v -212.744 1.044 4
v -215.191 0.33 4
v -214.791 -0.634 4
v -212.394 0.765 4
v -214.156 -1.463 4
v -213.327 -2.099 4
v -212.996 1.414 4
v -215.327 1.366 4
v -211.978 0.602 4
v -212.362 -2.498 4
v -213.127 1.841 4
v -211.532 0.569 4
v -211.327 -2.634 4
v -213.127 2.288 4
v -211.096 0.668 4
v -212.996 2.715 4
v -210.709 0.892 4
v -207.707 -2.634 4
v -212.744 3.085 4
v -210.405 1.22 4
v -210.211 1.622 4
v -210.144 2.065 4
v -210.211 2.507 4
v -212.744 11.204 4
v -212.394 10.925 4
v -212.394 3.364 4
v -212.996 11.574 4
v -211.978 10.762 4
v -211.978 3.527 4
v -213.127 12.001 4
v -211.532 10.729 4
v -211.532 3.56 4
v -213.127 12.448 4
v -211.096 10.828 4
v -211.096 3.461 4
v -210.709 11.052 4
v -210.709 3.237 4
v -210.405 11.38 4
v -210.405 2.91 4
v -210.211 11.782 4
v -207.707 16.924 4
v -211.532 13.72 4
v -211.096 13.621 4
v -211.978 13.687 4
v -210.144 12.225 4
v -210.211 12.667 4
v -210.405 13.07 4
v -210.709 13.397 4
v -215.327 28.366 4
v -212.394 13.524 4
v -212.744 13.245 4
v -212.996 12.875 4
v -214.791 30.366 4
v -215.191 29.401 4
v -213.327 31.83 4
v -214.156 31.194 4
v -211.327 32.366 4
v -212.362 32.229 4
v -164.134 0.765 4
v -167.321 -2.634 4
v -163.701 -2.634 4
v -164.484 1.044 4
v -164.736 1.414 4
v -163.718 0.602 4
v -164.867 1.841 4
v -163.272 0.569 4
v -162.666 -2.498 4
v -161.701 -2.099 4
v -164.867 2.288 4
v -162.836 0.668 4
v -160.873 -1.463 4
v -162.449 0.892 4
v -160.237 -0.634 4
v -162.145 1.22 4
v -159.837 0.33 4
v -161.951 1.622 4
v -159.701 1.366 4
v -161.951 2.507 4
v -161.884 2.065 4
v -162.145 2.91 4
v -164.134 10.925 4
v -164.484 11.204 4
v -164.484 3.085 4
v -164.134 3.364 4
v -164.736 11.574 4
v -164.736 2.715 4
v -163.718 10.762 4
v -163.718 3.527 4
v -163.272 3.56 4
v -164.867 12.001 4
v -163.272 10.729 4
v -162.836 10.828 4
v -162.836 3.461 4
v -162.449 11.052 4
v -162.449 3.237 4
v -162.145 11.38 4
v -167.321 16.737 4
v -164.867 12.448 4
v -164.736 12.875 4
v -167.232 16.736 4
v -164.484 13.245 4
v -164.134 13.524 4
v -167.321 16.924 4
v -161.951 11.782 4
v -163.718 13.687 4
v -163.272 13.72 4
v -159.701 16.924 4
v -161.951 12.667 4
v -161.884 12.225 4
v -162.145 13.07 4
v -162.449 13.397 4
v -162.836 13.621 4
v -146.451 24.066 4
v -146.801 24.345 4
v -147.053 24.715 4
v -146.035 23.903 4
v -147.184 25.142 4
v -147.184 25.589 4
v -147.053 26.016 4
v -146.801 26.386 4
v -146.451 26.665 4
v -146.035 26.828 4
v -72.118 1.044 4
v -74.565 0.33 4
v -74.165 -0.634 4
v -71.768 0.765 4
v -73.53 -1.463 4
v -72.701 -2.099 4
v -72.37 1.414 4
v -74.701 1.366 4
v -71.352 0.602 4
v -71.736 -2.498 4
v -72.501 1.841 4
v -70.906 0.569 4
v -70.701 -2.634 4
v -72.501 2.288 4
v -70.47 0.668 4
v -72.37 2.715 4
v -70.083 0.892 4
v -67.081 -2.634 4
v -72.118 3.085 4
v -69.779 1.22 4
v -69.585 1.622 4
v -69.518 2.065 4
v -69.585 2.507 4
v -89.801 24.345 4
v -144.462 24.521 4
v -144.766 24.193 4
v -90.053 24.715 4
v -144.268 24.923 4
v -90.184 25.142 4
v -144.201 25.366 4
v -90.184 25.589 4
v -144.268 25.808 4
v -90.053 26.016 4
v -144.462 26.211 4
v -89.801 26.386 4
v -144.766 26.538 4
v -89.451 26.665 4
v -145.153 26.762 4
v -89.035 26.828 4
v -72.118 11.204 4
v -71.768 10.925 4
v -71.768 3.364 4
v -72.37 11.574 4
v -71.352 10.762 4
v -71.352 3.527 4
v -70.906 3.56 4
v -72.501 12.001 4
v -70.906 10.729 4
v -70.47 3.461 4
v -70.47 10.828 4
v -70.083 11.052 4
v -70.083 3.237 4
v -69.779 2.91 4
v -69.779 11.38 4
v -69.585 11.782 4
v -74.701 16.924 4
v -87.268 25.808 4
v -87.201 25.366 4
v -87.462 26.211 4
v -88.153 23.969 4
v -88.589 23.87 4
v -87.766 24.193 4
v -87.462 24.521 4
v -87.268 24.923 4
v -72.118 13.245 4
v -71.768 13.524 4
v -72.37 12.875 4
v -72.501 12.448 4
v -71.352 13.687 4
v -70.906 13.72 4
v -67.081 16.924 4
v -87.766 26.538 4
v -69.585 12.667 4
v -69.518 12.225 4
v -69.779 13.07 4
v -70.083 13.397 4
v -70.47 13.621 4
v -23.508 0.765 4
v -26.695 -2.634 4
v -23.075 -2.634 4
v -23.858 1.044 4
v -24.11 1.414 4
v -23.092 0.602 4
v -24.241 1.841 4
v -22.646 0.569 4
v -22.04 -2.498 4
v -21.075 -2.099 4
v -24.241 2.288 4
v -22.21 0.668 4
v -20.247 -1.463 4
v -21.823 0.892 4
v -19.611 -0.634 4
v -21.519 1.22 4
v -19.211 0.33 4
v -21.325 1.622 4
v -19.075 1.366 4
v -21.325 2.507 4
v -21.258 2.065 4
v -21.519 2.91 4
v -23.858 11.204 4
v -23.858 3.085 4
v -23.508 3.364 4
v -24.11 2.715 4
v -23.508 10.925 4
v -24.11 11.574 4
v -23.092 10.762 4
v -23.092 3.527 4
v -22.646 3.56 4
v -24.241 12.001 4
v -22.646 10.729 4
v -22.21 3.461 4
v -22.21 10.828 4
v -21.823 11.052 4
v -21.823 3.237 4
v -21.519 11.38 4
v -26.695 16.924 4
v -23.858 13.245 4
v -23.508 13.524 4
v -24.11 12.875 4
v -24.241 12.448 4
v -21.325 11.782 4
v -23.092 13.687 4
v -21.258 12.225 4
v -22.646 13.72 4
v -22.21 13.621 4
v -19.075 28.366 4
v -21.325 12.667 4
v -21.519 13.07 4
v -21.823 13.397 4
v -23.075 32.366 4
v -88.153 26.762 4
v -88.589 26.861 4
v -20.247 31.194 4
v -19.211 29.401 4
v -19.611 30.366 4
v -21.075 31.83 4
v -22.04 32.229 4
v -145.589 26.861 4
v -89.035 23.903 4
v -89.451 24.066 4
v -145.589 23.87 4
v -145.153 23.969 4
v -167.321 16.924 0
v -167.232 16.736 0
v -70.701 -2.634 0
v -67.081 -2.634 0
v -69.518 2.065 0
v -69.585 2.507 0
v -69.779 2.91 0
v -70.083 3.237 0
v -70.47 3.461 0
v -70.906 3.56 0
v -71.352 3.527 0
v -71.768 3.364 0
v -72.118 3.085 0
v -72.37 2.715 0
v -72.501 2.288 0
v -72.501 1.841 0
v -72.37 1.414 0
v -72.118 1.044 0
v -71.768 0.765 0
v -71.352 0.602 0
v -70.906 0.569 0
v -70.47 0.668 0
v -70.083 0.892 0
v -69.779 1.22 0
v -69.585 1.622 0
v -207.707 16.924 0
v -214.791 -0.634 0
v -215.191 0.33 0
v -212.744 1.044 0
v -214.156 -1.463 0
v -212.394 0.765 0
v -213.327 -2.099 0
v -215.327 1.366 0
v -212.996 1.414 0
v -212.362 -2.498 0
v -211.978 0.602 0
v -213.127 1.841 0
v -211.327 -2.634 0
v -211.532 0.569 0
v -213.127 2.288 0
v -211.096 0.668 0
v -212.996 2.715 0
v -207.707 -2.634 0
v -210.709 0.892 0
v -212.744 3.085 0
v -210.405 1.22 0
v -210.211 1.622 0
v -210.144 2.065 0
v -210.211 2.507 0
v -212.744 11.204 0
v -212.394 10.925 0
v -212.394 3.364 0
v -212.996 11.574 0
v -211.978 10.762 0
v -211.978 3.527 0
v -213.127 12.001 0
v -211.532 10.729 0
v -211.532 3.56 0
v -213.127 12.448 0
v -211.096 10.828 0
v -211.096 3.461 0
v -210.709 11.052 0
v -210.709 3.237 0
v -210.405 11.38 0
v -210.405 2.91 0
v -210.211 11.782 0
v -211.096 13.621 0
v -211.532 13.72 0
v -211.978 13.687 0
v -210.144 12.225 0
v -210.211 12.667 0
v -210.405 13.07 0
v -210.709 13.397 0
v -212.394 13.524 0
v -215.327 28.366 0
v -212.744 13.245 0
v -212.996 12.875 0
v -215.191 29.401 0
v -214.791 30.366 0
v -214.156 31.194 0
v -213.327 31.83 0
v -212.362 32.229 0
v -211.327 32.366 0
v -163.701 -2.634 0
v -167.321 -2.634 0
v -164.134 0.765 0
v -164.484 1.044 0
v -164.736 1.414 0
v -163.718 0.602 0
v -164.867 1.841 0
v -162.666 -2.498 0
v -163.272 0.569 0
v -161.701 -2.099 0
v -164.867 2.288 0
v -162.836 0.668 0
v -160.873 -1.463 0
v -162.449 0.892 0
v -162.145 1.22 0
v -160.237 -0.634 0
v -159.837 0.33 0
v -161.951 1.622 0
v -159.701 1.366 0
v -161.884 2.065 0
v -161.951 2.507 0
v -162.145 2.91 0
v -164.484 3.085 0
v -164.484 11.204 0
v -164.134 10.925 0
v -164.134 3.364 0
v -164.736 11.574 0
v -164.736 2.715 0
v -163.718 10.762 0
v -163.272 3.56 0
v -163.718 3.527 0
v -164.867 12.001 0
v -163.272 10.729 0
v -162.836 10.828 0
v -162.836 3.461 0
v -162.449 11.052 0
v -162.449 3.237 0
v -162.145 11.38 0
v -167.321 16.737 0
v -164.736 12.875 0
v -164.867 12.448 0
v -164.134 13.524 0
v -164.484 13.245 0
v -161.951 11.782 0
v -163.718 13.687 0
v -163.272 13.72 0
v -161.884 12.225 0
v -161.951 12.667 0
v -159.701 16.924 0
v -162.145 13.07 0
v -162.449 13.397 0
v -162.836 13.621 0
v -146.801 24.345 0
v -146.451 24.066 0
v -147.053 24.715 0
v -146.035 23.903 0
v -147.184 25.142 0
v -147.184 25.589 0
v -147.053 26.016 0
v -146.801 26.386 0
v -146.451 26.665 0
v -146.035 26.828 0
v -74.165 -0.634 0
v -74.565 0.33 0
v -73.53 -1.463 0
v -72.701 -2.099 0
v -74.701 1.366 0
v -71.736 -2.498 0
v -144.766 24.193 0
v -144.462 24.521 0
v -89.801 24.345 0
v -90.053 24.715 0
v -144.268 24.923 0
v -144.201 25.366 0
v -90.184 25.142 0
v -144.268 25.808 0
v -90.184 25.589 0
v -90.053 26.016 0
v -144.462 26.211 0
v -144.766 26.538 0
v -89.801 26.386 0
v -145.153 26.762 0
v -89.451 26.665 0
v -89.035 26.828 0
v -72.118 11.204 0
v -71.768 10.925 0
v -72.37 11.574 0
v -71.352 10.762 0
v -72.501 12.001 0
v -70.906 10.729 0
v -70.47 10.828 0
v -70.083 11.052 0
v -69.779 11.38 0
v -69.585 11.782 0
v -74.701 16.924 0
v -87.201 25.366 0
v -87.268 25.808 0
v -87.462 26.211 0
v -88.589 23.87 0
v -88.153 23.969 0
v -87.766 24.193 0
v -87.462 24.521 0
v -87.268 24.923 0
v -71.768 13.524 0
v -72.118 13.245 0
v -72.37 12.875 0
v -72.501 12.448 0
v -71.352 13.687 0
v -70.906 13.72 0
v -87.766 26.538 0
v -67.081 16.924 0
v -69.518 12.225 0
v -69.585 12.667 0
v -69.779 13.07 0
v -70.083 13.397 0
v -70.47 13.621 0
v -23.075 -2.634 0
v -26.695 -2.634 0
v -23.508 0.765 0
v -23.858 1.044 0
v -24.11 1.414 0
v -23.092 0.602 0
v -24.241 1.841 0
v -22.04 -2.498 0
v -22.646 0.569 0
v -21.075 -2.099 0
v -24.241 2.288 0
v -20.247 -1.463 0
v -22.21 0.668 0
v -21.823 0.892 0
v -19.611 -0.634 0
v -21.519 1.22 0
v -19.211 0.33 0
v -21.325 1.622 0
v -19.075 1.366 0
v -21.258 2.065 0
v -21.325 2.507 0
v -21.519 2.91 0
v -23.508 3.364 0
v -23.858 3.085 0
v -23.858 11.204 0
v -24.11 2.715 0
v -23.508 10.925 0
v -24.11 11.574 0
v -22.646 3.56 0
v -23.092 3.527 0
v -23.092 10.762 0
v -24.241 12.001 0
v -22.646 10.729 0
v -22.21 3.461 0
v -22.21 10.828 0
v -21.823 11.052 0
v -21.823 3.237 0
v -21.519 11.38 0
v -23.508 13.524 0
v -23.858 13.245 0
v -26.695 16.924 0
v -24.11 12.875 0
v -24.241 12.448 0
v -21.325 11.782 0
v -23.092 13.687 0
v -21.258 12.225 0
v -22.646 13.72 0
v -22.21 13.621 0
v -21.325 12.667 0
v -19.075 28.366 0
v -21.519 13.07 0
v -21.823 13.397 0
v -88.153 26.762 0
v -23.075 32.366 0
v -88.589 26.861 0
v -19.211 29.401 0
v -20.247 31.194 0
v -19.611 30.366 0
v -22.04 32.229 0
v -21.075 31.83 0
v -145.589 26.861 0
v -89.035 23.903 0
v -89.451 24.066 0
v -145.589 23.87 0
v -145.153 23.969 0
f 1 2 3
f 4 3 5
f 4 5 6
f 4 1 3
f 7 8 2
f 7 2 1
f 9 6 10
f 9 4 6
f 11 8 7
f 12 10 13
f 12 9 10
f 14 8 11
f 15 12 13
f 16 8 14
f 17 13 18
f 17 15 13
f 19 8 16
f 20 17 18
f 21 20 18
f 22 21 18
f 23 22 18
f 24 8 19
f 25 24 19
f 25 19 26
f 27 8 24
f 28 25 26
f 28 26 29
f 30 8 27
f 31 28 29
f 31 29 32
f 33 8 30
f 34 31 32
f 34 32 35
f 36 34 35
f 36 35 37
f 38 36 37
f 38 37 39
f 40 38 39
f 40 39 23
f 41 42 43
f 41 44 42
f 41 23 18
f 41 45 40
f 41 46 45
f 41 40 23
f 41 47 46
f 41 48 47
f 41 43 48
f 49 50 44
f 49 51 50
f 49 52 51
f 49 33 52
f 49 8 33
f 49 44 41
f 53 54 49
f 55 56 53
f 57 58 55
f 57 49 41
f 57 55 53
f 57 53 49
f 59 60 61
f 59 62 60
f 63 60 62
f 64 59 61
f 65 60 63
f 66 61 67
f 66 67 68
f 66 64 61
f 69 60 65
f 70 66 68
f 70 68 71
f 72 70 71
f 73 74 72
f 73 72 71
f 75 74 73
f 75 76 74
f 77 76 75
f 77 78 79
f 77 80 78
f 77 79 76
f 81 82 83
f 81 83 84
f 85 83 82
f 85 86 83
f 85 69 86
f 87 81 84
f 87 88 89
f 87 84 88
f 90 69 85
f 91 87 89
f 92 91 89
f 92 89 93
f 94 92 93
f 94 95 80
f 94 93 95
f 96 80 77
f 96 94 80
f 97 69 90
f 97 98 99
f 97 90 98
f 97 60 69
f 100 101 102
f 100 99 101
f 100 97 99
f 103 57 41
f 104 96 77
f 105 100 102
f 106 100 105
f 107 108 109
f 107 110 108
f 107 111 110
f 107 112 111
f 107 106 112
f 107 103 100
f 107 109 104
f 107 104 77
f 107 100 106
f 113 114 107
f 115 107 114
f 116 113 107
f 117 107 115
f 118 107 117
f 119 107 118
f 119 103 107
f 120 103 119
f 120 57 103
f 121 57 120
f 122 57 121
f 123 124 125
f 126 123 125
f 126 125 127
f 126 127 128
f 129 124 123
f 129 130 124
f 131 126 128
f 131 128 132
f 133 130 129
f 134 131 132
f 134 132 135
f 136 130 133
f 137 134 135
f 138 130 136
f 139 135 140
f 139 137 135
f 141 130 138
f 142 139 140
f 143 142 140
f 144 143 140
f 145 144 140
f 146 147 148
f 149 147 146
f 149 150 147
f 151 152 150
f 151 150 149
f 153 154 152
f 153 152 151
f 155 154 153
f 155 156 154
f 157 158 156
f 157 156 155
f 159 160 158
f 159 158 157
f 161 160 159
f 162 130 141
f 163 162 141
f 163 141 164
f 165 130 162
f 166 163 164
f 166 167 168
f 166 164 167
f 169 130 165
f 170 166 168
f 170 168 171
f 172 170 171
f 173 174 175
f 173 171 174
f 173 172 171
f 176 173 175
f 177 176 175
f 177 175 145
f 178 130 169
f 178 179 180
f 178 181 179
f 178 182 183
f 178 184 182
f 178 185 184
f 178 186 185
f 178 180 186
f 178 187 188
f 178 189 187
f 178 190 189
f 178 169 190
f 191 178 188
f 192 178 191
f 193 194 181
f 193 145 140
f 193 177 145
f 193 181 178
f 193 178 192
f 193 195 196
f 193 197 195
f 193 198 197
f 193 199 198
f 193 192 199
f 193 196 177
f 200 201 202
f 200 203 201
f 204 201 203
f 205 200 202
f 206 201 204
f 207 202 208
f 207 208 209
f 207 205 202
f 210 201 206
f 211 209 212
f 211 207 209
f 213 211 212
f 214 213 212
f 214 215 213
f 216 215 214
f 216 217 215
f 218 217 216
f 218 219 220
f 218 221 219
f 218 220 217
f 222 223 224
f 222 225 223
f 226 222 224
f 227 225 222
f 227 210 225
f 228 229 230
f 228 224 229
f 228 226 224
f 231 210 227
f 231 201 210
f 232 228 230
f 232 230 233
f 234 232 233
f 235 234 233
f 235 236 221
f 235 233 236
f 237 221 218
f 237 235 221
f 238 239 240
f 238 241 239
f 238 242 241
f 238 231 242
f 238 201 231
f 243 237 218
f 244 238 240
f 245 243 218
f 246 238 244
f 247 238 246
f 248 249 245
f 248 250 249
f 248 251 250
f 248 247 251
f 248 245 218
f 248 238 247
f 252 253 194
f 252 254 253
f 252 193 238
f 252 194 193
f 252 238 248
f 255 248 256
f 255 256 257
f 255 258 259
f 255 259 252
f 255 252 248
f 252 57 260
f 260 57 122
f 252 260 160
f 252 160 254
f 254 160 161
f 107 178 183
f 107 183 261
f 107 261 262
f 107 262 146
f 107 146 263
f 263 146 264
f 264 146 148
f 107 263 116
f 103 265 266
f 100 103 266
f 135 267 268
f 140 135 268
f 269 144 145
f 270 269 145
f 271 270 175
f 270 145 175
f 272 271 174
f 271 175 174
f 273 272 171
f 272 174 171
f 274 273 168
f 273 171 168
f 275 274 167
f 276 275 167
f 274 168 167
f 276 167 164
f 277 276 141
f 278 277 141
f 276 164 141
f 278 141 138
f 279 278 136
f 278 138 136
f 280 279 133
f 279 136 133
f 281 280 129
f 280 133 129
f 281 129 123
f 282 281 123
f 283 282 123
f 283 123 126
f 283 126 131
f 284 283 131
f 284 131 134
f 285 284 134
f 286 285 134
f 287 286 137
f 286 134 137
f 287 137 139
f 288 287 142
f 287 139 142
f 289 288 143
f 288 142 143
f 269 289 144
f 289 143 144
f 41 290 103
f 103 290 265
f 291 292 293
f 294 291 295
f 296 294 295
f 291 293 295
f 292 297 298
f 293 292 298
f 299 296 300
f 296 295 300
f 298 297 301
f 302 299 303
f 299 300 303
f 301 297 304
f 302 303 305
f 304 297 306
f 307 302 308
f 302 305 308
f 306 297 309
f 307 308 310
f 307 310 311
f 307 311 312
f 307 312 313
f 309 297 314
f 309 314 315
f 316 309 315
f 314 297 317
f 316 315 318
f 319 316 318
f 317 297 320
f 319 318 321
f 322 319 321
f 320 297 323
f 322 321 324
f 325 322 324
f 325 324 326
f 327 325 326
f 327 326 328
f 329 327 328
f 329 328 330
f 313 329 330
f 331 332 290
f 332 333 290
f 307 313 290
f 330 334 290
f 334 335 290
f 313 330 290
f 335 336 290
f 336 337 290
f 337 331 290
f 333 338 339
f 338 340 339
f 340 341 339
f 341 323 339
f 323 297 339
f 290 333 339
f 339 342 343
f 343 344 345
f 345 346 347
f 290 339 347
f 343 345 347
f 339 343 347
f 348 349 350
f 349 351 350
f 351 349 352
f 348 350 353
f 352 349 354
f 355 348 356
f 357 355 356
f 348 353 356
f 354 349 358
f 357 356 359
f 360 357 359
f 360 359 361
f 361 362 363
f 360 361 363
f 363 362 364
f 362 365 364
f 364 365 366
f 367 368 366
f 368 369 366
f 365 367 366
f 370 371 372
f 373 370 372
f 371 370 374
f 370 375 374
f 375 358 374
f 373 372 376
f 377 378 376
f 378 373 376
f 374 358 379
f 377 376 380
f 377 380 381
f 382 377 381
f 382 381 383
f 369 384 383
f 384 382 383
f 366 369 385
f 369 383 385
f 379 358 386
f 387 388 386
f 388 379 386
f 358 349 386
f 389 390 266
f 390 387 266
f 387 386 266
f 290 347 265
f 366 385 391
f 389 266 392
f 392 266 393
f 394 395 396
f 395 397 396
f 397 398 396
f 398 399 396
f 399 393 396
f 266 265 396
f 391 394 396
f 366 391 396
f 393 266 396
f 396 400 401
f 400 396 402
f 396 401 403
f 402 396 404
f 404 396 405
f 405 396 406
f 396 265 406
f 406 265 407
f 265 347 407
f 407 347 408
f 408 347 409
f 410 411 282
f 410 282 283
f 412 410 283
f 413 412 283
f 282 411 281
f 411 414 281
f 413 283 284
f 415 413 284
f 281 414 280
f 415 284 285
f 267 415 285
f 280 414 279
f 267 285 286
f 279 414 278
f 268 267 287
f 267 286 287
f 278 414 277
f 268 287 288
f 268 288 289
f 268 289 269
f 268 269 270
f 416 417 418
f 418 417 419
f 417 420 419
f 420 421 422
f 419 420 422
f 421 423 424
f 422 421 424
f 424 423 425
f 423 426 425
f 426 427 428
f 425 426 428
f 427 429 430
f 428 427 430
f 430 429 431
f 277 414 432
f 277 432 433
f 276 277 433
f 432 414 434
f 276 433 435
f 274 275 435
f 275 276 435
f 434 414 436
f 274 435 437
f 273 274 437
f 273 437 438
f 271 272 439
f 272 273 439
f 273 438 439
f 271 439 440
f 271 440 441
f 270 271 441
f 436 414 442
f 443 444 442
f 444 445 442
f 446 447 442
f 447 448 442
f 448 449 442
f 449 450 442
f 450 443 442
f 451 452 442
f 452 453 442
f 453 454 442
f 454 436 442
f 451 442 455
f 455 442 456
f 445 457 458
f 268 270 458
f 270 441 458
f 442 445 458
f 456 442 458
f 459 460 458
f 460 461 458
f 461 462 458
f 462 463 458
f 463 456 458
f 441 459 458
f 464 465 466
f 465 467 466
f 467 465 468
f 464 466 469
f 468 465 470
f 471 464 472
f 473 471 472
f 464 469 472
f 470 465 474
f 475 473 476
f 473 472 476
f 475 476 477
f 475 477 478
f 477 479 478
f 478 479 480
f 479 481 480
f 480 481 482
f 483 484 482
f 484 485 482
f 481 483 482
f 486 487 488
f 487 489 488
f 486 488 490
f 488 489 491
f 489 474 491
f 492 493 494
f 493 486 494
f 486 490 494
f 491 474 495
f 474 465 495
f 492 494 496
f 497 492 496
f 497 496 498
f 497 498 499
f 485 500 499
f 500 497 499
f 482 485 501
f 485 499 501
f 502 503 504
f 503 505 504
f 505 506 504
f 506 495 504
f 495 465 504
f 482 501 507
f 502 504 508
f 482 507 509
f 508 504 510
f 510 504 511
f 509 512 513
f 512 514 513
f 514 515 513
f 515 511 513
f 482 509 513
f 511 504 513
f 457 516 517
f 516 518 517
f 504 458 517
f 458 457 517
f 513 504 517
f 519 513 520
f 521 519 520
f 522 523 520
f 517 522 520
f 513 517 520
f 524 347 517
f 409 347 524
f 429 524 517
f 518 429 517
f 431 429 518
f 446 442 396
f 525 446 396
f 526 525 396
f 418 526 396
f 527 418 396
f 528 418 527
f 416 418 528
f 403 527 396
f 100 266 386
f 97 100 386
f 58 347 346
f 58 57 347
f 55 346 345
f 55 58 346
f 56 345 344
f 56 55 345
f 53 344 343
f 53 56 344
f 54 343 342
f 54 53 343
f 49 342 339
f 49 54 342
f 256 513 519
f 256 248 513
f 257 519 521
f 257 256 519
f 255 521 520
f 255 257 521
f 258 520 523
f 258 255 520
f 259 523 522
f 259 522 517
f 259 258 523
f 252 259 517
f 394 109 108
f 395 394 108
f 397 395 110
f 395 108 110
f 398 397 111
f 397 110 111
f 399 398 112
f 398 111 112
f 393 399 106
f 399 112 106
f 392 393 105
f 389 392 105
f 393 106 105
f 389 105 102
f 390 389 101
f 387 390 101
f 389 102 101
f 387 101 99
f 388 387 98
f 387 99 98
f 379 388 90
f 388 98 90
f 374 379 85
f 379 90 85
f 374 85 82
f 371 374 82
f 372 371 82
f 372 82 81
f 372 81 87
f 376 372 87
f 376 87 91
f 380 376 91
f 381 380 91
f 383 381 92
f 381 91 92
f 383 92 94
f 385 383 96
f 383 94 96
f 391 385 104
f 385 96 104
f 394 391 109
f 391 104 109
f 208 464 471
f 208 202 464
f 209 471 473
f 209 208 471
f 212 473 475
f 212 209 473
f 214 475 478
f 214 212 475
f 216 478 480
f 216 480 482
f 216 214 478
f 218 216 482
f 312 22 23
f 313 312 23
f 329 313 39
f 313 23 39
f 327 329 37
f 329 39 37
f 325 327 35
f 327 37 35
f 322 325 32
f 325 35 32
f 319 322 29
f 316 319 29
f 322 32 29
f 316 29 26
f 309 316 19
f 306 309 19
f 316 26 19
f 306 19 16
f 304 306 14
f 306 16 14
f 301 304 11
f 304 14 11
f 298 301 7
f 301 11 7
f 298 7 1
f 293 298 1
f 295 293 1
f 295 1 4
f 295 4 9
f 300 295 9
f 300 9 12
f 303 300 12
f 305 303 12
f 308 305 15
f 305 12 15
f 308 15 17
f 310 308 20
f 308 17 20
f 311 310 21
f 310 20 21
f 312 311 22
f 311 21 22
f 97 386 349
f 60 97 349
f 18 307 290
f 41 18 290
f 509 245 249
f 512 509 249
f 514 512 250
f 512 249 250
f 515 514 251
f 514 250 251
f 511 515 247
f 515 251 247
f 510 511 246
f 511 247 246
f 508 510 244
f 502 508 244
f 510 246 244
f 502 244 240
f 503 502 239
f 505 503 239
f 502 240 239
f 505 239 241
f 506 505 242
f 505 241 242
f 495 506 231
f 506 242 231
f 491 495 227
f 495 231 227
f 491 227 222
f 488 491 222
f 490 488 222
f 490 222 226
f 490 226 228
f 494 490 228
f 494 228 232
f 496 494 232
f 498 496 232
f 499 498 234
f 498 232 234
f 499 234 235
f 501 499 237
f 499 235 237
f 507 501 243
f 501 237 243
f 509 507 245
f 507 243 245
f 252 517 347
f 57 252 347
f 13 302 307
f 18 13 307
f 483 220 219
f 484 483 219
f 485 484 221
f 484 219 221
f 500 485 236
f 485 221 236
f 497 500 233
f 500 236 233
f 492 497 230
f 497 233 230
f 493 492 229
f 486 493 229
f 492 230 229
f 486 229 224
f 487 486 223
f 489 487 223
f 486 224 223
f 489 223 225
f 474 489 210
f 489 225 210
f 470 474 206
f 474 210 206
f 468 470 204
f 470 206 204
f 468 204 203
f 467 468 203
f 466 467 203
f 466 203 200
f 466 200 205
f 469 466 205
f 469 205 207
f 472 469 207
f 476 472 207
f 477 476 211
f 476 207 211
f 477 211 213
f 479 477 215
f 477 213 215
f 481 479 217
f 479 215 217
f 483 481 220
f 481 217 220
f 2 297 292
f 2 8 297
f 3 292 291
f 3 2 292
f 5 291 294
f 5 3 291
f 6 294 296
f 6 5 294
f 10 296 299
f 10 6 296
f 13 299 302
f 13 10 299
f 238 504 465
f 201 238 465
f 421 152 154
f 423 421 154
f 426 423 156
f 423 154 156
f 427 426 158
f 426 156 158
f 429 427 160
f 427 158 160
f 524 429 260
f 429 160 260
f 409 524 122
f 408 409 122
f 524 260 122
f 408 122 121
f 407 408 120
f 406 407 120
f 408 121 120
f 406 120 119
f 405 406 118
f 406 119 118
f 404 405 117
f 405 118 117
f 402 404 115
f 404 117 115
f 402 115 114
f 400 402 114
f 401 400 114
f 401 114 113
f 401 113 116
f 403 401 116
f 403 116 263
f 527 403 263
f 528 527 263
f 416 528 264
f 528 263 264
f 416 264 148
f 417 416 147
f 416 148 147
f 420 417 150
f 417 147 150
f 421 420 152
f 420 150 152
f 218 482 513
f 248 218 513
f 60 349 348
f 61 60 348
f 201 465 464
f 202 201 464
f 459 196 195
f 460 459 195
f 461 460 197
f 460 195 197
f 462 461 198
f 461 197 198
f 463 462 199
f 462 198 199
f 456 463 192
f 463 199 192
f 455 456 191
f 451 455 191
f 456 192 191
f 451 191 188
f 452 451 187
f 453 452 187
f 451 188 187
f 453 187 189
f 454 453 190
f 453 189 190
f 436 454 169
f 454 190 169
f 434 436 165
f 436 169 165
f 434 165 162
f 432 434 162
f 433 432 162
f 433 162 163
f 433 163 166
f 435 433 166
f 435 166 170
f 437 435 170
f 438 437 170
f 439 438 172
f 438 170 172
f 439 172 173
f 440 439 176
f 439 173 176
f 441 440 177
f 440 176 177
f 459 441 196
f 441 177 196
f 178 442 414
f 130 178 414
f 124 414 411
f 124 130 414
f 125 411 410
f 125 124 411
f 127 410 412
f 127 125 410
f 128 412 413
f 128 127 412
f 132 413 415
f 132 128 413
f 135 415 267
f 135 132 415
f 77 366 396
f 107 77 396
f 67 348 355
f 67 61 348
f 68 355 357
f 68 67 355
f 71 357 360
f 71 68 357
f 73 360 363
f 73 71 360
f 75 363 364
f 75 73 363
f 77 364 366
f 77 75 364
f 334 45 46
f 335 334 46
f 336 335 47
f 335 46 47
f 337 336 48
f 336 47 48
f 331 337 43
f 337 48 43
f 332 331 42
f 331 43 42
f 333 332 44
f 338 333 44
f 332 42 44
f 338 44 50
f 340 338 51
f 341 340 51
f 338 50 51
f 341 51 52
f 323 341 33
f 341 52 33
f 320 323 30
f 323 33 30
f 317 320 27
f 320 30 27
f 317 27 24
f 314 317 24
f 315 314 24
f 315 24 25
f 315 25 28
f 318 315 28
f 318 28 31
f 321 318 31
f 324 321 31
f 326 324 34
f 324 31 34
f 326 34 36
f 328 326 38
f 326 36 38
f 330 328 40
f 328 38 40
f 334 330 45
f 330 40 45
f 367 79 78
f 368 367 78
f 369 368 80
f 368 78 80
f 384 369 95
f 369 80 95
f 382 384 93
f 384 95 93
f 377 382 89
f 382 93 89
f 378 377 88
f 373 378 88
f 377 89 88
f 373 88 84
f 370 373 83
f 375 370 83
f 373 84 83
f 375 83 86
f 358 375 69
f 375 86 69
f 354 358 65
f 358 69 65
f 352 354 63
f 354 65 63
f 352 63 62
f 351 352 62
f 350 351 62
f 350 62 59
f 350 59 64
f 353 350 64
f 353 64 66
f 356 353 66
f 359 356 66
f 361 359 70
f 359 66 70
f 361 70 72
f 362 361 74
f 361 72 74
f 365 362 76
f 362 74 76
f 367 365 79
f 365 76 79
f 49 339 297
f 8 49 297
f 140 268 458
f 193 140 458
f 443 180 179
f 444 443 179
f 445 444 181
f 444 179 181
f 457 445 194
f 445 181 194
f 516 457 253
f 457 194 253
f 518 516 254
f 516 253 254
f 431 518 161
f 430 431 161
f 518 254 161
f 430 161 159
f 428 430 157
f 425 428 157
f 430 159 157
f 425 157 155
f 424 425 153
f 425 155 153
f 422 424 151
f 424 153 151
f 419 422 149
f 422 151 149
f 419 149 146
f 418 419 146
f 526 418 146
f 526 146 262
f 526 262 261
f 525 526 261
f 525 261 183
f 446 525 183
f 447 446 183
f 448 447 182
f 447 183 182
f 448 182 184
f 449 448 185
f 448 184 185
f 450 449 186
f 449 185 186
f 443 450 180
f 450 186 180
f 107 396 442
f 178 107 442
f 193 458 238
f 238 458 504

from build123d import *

# Parameters (mm, degrees)
BOSS_EXTRUDE2_DEPTH = 4
FILLET1_R           = 4
SKETCH6_R           = 1.5
CUT_EXTRUDE1_DEPTH  = 4
SKETCH3_R           = 1.5
CUT_EXTRUDE2_DEPTH  = 4


with BuildPart() as part:
    # Sketch2 → Boss-Extrude2 (new body)
    with BuildSketch(Plane.XY):
        Polygon((-67.081093968, -2.634474623), (-67.081093968, 16.923525377), (-26.695093968, 16.923525377), (-26.695093968, -2.634474623), (-19.075093968, -2.634474623), (-19.075093968, 32.365525377), (-67.081093968, 32.365525377), (-74.701093968, 32.365525377), (-159.701093968, 32.365525377), (-167.321093968, 32.365525377), (-215.327093968, 32.365525377), (-215.327093968, -2.634474623), (-207.707093968, -2.634474623), (-207.707093968, 16.923525377), (-167.321093968, 16.923525377), (-167.231910297, 16.736340115), (-167.321093968, 16.736752562), (-167.321093968, -2.634474623), (-159.701093968, -2.634474623), (-159.701093968, 16.923525377), (-74.701093968, 16.923525377), (-74.701093968, -2.634474623), align=None)
    extrude(amount=BOSS_EXTRUDE2_DEPTH)

    # Fillet1
    fillet1_edges = [part.edges().sort_by_distance(p)[0] for p in [
        (-19.075093968, 32.365525377, 2),
        (-19.075093968, -2.634474623, 2),
        (-74.701093968, -2.634474623, 2),
        (-159.701093968, -2.634474623, 2),
        (-215.327093968, -2.634474623, 2),
        (-215.327093968, 32.365525377, 2),
    ]]
    fillet(fillet1_edges, radius=FILLET1_R)

    # Sketch6 → Cut-Extrude1 (cut)
    with BuildSketch(Plane.XY.offset(4)):
        with Locations((-211.644093968, 12.224525377)):
            Circle(SKETCH6_R)
        with Locations((-163.384093968, 12.224525377)):
            Circle(SKETCH6_R)
        with Locations((-163.384093968, 2.064525377)):
            Circle(SKETCH6_R)
        with Locations((-211.644093968, 2.064525377)):
            Circle(SKETCH6_R)
        with Locations((-71.018093968, 12.224525377)):
            Circle(SKETCH6_R)
        with Locations((-22.758093968, 12.224525377)):
            Circle(SKETCH6_R)
        with Locations((-22.758093968, 2.064525377)):
            Circle(SKETCH6_R)
        with Locations((-71.018093968, 2.064525377)):
            Circle(SKETCH6_R)
    extrude(amount=-CUT_EXTRUDE1_DEPTH, mode=Mode.SUBTRACT)

    # Sketch3 → Cut-Extrude2 (cut)
    with BuildSketch(Plane.XY.offset(4)):
        with Locations((-145.701093968, 25.365525377)):
            Circle(SKETCH3_R)
        with Locations((-88.701093968, 25.365525377)):
            Circle(SKETCH3_R)
    extrude(amount=-CUT_EXTRUDE2_DEPTH, mode=Mode.SUBTRACT)


solid = part.part
